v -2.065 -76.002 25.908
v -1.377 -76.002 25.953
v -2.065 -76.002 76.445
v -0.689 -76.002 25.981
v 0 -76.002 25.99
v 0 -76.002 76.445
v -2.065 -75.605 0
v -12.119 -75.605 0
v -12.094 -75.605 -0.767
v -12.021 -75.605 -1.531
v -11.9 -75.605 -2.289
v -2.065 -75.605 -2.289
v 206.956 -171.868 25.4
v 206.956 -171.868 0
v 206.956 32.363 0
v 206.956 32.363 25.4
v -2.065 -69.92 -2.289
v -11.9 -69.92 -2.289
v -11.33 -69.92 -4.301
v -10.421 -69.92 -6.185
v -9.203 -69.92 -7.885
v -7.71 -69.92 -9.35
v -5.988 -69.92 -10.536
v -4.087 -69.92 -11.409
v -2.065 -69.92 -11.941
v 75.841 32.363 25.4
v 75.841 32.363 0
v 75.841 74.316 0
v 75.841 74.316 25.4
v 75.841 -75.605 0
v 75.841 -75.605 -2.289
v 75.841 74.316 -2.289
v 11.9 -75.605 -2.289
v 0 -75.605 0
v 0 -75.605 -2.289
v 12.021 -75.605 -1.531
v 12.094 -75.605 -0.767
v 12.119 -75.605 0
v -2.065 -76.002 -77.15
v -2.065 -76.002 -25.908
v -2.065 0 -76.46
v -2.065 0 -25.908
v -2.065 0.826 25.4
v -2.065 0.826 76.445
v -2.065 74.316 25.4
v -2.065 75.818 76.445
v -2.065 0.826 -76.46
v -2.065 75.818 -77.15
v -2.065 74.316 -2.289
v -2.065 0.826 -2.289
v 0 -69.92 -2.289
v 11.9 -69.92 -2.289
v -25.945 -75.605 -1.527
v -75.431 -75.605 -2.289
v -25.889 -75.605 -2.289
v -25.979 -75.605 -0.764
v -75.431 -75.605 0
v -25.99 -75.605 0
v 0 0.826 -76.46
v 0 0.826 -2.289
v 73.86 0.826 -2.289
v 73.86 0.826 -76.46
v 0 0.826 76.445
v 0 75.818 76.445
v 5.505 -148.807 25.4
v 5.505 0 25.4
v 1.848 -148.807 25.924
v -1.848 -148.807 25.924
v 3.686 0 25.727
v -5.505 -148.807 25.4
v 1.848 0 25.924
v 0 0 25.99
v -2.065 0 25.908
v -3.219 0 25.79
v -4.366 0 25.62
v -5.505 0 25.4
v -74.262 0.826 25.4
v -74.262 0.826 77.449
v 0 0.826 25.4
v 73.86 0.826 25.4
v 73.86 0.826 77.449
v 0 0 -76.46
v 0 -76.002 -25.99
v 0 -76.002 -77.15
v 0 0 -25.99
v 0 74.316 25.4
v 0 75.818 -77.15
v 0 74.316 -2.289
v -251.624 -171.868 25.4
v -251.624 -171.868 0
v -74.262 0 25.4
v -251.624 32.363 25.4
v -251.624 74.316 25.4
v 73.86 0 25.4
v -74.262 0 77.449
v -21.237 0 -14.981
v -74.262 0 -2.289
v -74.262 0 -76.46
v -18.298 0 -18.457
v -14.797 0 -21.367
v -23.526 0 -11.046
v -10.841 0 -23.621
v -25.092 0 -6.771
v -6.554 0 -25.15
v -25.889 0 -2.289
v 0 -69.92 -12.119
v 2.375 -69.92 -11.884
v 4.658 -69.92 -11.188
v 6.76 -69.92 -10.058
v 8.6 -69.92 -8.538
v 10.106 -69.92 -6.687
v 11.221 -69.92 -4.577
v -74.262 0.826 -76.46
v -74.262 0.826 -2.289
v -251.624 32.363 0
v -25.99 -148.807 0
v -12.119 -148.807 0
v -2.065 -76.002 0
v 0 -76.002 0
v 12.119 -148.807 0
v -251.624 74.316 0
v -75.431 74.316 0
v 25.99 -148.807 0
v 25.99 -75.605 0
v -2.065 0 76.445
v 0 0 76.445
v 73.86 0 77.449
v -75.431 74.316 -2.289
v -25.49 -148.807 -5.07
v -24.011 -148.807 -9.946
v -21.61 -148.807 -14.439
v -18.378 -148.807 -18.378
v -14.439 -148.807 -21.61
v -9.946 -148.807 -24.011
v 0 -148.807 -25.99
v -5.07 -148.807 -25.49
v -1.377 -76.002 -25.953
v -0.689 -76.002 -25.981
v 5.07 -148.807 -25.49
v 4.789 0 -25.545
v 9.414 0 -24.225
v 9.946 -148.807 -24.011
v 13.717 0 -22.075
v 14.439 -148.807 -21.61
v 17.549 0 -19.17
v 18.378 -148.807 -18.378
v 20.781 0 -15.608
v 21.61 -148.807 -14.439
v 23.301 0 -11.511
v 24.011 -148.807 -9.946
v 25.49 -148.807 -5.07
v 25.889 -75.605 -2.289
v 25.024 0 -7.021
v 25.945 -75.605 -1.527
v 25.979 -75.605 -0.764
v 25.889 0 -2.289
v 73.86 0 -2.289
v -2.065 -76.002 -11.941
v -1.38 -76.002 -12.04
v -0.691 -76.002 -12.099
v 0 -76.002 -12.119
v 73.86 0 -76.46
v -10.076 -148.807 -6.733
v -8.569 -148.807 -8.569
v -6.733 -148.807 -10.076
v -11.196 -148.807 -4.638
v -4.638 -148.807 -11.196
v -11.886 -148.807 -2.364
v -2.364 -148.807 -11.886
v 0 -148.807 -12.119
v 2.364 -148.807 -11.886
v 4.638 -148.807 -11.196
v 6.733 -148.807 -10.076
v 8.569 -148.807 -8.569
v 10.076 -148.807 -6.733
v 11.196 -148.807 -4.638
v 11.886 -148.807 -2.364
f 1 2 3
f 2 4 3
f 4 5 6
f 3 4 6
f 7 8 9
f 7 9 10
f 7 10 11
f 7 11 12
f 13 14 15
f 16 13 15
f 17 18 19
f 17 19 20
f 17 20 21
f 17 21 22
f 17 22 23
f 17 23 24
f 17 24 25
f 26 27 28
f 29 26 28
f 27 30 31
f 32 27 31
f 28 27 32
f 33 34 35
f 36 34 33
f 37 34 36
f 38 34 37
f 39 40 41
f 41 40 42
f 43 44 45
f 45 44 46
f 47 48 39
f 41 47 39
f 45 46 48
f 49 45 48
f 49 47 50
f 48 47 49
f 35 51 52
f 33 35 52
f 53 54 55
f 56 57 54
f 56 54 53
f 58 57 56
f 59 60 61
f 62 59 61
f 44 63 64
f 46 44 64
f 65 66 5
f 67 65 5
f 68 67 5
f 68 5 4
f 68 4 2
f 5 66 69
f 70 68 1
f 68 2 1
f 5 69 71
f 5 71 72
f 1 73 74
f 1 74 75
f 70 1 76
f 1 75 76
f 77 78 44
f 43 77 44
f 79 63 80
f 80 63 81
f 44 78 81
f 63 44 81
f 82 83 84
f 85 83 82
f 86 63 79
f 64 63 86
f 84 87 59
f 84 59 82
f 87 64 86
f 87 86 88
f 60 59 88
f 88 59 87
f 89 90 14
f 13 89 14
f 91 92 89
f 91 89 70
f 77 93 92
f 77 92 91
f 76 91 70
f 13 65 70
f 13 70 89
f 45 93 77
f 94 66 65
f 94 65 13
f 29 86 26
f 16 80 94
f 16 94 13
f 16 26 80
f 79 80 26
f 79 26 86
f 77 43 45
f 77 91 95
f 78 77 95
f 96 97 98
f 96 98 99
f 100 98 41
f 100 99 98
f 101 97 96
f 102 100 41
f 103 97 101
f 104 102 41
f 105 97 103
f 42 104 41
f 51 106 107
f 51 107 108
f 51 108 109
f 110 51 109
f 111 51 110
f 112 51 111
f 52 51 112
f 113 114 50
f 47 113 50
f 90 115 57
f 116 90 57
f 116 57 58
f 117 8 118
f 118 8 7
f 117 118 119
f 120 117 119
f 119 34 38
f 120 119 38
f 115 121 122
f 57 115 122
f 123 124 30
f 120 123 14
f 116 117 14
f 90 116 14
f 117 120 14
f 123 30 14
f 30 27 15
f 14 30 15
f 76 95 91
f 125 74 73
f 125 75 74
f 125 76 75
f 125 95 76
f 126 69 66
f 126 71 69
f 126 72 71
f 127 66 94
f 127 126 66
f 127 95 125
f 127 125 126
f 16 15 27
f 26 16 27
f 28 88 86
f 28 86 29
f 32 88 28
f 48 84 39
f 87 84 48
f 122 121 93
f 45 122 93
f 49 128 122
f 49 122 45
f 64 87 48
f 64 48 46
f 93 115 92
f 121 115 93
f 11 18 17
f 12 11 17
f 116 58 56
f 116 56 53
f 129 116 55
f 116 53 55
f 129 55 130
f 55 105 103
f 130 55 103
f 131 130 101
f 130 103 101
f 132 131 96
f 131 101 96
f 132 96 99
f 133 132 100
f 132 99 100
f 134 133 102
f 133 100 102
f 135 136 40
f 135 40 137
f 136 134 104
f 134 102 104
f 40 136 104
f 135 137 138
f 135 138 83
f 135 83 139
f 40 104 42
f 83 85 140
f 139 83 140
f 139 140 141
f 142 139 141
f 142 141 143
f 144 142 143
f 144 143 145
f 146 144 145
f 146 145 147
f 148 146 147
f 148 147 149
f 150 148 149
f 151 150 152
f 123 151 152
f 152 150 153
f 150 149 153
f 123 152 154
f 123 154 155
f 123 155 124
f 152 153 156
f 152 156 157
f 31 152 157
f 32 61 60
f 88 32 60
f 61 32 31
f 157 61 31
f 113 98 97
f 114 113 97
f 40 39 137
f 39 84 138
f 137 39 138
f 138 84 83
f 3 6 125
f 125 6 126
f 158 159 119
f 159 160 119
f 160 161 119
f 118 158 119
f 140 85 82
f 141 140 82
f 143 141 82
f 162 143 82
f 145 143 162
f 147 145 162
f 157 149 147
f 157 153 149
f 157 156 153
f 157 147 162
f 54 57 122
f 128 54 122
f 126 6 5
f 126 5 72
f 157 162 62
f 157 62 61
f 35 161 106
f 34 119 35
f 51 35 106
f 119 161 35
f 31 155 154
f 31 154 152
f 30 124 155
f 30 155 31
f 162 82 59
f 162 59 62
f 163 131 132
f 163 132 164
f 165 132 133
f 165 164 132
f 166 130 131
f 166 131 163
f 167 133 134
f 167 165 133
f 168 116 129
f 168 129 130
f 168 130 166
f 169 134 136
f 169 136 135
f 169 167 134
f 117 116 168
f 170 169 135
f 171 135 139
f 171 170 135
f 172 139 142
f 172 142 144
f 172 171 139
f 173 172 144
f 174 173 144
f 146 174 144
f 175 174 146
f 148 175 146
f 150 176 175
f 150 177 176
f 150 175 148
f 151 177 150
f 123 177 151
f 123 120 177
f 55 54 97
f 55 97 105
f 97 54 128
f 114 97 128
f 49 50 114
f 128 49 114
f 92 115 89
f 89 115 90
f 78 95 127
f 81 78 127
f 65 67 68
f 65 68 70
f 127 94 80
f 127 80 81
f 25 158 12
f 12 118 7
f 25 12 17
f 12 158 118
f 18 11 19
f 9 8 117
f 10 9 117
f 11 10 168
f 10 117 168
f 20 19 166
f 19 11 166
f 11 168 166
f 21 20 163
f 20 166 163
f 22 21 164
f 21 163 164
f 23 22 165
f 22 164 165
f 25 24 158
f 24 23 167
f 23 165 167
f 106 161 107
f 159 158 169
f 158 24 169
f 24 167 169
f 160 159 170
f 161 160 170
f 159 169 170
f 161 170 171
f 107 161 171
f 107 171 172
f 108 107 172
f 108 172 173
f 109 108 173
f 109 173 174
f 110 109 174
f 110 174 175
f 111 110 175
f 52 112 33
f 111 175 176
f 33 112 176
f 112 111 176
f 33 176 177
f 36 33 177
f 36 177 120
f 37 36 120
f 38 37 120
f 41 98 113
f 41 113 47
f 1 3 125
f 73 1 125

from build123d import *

# Parameters (mm, degrees)
F0_R      = 25.989755
F1_DEPTH  = 148.806557
F2_R      = 12.118644
F3_DEPTH  = 78.886919
F4_R      = 12.50989
F5_DEPTH  = 42.680472
F6_W      = 151.272334
F6_H      = 149.920389
F7_DEPTH  = 2.289401
F8_W      = 151.820213
F8_H      = 153.594725
F9_DEPTH  = 2.064951
F10_W     = 148.121752
F10_H     = 153.908267
F11_DEPTH = 0.826154
F12_W     = 327.465571
F12_H     = 41.953165
F13_DEPTH = 25.4


with BuildPart() as f1:
    # F0 (on Front) → F1 (new body)
    with BuildSketch(Plane.XZ):
        Circle(F0_R)
    extrude(amount=F1_DEPTH)

    # F2 (on face) → F3 (cut)
    with BuildSketch(Plane.XZ.offset(148.806557)):
        Circle(F2_R)
    extrude(amount=-F3_DEPTH, mode=Mode.SUBTRACT)

    # F4 (on face) → F5 (join)
    with BuildSketch(Plane.XZ.offset(69.919638)):
        with Locations((-6.009842, 0)):
            Circle(F4_R)
    extrude(amount=-F5_DEPTH)

    # F6 (on Top) → F7 (join)
    with BuildSketch(Plane.XY):
        with Locations((0.205088, -0.644424)):
            Rectangle(F6_W, F6_H)
    extrude(amount=-F7_DEPTH)

    # F8 (on Right) → F9 (join)
    with BuildSketch(Plane.YZ):
        with Locations((-0.092081, -0.352483)):
            Rectangle(F8_W, F8_H)
    extrude(amount=-F9_DEPTH)

    # F10 (on Front) → F11 (join)
    with BuildSketch(Plane.XZ):
        with Locations((-0.201192, 0.494554)):
            Rectangle(F10_W, F10_H)
    extrude(amount=-F11_DEPTH)

    # F12 (on face) → F13 (join)
    with BuildSketch(Plane.XY):
        with Locations((-87.891531, 53.339188)):
            Rectangle(F12_W, F12_H)
        Polygon((206.956223, 32.362606), (75.841255, 32.362606), (-251.624316, 32.362606), (-251.624316, -171.868116), (206.956223, -171.868116), align=None)
    extrude(amount=F13_DEPTH)


solid = f1.part
